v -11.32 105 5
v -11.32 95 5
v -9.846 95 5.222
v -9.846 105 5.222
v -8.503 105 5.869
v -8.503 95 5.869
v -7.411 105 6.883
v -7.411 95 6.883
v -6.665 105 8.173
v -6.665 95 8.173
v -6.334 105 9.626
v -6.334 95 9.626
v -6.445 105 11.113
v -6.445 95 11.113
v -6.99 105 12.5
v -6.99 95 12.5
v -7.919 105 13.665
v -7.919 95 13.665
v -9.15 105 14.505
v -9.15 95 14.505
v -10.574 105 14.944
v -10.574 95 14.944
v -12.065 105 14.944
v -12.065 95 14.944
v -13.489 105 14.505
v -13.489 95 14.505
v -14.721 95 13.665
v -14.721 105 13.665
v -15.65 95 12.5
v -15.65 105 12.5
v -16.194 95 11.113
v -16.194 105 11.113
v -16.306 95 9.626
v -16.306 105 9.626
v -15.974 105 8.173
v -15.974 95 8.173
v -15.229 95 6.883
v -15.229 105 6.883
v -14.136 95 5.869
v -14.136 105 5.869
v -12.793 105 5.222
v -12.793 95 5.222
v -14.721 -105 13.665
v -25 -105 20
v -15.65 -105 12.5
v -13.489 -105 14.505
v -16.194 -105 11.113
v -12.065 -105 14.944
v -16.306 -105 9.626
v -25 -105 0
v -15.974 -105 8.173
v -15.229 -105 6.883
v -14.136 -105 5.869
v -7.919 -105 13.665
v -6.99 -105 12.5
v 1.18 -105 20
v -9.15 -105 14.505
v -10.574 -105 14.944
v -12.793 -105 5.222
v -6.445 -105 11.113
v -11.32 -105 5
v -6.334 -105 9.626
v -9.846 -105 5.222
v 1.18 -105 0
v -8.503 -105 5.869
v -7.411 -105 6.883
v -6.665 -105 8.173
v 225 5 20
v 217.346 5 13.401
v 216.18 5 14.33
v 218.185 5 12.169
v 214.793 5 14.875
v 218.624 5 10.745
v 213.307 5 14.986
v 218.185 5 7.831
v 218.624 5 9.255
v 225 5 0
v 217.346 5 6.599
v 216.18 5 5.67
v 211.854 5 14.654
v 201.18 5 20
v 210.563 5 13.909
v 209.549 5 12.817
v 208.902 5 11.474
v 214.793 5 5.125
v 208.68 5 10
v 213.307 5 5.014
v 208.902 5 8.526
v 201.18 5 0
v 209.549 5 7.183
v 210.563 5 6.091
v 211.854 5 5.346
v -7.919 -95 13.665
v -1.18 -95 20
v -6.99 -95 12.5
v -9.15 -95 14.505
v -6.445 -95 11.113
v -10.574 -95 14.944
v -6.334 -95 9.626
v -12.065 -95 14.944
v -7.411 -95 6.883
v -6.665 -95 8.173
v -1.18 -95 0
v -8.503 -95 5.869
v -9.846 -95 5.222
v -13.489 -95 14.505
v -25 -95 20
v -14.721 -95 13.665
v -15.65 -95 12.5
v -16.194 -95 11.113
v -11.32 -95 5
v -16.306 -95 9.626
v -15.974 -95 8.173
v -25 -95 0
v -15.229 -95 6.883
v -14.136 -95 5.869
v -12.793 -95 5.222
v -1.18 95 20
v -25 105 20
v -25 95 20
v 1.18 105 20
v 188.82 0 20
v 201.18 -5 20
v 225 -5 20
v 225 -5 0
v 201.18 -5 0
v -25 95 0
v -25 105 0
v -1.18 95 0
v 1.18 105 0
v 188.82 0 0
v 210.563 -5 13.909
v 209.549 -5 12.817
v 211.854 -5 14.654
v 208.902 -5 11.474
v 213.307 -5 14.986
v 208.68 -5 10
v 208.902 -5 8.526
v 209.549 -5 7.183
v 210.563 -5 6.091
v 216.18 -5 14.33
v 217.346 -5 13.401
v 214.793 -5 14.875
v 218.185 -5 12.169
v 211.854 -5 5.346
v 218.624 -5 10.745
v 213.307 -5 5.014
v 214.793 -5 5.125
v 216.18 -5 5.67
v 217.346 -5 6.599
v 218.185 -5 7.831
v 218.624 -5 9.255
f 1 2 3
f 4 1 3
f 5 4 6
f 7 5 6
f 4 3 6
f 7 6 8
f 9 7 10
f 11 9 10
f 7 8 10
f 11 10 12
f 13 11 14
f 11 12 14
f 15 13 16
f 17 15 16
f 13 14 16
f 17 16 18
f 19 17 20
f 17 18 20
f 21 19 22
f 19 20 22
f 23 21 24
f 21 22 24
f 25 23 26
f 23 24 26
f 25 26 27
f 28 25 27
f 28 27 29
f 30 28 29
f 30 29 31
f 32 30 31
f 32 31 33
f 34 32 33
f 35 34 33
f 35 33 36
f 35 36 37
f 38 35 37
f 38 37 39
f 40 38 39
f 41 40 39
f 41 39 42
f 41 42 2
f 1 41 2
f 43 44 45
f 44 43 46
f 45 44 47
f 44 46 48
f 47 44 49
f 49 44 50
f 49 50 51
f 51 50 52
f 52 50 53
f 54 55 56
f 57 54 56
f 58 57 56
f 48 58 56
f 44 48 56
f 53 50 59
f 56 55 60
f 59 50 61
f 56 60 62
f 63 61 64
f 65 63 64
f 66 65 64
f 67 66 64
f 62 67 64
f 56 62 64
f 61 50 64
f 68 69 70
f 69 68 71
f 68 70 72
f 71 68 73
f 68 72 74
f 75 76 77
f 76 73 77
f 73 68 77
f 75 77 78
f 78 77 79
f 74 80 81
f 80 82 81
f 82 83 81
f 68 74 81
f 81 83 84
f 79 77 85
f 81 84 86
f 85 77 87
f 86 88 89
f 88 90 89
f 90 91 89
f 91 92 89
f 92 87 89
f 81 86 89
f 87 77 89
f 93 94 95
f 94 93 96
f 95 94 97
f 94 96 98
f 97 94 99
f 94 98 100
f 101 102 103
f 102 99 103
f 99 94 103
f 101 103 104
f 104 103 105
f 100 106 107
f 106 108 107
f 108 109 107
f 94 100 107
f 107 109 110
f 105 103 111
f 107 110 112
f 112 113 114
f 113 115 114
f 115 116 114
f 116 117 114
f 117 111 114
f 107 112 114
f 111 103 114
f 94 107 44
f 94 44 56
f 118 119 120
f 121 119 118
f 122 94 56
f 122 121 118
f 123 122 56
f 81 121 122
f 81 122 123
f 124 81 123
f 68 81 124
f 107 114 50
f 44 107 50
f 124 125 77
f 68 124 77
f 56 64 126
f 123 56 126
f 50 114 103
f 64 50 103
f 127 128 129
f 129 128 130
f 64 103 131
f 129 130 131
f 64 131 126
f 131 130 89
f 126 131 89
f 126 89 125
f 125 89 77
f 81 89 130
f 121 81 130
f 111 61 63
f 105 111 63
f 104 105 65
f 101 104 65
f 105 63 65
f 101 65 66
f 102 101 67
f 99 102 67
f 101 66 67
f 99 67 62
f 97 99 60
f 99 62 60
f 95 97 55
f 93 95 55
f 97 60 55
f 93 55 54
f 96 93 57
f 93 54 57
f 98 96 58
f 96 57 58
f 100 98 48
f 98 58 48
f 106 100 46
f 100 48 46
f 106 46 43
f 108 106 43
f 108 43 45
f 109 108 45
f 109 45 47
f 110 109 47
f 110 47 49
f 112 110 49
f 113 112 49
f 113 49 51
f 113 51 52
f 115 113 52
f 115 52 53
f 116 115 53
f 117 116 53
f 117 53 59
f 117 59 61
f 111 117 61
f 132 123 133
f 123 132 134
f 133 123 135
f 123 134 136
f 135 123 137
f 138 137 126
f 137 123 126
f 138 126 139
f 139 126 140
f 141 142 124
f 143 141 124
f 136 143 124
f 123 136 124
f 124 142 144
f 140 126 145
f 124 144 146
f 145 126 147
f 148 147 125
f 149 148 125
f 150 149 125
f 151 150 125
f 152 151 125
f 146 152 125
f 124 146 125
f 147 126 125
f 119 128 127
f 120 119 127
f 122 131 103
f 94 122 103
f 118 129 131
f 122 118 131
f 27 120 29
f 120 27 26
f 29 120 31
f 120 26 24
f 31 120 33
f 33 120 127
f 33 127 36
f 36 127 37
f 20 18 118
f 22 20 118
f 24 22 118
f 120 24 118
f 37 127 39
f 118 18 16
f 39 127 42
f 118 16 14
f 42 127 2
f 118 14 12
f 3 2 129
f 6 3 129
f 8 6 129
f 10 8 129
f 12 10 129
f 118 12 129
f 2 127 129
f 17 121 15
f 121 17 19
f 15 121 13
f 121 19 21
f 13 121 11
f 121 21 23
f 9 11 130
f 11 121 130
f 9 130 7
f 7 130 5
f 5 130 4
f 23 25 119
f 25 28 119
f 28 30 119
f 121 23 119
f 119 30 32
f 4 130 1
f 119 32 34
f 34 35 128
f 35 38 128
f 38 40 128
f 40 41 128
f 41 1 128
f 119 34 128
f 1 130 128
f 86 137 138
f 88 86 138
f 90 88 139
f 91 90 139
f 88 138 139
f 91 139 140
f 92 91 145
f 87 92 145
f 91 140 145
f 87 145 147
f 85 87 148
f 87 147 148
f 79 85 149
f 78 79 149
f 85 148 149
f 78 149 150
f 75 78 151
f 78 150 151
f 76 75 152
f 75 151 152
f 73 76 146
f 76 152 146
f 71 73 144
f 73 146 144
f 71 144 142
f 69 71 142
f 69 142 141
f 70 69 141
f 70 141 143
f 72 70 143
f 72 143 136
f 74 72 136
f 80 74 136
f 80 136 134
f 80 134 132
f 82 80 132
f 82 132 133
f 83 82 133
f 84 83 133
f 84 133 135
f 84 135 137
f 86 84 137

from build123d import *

# Parameters (mm, degrees)
EXTRUDE_THIN4_DEPTH = 20
SKETCH2_R           = 5
CUT_EXTRUDE1_DEPTH  = 235


# Read off the part's stored shape, not the designer's step: Extrude-Thin4
with BuildPart() as part:
    # Extrude-Thin4 outline → Extrude-Thin4 (new body)
    with BuildSketch(Plane.XY):
        Polygon((201.180339887, 5), (1.180339887, 105), (-25, 105), (-25, 95), (-1.180339887, 95), (188.819660113, 0), (-1.180339887, -95), (-25, -95), (-25, -105), (1.180339887, -105), (201.180339887, -5), (225, -5), (225, 5), align=None)
    extrude(amount=EXTRUDE_THIN4_DEPTH)

    # Sketch2 → Cut-Extrude1 (cut)
    with BuildSketch(Plane.XZ.offset(105)):
        with Locations(Location((-11.319660113, 10, 0), (0, 0, 270))):
            Circle(SKETCH2_R)
        with Locations(Location((213.680339887, 10, 0), (0, 0, 180))):
            Circle(SKETCH2_R)
    extrude(amount=-CUT_EXTRUDE1_DEPTH, mode=Mode.SUBTRACT)


solid = part.part
